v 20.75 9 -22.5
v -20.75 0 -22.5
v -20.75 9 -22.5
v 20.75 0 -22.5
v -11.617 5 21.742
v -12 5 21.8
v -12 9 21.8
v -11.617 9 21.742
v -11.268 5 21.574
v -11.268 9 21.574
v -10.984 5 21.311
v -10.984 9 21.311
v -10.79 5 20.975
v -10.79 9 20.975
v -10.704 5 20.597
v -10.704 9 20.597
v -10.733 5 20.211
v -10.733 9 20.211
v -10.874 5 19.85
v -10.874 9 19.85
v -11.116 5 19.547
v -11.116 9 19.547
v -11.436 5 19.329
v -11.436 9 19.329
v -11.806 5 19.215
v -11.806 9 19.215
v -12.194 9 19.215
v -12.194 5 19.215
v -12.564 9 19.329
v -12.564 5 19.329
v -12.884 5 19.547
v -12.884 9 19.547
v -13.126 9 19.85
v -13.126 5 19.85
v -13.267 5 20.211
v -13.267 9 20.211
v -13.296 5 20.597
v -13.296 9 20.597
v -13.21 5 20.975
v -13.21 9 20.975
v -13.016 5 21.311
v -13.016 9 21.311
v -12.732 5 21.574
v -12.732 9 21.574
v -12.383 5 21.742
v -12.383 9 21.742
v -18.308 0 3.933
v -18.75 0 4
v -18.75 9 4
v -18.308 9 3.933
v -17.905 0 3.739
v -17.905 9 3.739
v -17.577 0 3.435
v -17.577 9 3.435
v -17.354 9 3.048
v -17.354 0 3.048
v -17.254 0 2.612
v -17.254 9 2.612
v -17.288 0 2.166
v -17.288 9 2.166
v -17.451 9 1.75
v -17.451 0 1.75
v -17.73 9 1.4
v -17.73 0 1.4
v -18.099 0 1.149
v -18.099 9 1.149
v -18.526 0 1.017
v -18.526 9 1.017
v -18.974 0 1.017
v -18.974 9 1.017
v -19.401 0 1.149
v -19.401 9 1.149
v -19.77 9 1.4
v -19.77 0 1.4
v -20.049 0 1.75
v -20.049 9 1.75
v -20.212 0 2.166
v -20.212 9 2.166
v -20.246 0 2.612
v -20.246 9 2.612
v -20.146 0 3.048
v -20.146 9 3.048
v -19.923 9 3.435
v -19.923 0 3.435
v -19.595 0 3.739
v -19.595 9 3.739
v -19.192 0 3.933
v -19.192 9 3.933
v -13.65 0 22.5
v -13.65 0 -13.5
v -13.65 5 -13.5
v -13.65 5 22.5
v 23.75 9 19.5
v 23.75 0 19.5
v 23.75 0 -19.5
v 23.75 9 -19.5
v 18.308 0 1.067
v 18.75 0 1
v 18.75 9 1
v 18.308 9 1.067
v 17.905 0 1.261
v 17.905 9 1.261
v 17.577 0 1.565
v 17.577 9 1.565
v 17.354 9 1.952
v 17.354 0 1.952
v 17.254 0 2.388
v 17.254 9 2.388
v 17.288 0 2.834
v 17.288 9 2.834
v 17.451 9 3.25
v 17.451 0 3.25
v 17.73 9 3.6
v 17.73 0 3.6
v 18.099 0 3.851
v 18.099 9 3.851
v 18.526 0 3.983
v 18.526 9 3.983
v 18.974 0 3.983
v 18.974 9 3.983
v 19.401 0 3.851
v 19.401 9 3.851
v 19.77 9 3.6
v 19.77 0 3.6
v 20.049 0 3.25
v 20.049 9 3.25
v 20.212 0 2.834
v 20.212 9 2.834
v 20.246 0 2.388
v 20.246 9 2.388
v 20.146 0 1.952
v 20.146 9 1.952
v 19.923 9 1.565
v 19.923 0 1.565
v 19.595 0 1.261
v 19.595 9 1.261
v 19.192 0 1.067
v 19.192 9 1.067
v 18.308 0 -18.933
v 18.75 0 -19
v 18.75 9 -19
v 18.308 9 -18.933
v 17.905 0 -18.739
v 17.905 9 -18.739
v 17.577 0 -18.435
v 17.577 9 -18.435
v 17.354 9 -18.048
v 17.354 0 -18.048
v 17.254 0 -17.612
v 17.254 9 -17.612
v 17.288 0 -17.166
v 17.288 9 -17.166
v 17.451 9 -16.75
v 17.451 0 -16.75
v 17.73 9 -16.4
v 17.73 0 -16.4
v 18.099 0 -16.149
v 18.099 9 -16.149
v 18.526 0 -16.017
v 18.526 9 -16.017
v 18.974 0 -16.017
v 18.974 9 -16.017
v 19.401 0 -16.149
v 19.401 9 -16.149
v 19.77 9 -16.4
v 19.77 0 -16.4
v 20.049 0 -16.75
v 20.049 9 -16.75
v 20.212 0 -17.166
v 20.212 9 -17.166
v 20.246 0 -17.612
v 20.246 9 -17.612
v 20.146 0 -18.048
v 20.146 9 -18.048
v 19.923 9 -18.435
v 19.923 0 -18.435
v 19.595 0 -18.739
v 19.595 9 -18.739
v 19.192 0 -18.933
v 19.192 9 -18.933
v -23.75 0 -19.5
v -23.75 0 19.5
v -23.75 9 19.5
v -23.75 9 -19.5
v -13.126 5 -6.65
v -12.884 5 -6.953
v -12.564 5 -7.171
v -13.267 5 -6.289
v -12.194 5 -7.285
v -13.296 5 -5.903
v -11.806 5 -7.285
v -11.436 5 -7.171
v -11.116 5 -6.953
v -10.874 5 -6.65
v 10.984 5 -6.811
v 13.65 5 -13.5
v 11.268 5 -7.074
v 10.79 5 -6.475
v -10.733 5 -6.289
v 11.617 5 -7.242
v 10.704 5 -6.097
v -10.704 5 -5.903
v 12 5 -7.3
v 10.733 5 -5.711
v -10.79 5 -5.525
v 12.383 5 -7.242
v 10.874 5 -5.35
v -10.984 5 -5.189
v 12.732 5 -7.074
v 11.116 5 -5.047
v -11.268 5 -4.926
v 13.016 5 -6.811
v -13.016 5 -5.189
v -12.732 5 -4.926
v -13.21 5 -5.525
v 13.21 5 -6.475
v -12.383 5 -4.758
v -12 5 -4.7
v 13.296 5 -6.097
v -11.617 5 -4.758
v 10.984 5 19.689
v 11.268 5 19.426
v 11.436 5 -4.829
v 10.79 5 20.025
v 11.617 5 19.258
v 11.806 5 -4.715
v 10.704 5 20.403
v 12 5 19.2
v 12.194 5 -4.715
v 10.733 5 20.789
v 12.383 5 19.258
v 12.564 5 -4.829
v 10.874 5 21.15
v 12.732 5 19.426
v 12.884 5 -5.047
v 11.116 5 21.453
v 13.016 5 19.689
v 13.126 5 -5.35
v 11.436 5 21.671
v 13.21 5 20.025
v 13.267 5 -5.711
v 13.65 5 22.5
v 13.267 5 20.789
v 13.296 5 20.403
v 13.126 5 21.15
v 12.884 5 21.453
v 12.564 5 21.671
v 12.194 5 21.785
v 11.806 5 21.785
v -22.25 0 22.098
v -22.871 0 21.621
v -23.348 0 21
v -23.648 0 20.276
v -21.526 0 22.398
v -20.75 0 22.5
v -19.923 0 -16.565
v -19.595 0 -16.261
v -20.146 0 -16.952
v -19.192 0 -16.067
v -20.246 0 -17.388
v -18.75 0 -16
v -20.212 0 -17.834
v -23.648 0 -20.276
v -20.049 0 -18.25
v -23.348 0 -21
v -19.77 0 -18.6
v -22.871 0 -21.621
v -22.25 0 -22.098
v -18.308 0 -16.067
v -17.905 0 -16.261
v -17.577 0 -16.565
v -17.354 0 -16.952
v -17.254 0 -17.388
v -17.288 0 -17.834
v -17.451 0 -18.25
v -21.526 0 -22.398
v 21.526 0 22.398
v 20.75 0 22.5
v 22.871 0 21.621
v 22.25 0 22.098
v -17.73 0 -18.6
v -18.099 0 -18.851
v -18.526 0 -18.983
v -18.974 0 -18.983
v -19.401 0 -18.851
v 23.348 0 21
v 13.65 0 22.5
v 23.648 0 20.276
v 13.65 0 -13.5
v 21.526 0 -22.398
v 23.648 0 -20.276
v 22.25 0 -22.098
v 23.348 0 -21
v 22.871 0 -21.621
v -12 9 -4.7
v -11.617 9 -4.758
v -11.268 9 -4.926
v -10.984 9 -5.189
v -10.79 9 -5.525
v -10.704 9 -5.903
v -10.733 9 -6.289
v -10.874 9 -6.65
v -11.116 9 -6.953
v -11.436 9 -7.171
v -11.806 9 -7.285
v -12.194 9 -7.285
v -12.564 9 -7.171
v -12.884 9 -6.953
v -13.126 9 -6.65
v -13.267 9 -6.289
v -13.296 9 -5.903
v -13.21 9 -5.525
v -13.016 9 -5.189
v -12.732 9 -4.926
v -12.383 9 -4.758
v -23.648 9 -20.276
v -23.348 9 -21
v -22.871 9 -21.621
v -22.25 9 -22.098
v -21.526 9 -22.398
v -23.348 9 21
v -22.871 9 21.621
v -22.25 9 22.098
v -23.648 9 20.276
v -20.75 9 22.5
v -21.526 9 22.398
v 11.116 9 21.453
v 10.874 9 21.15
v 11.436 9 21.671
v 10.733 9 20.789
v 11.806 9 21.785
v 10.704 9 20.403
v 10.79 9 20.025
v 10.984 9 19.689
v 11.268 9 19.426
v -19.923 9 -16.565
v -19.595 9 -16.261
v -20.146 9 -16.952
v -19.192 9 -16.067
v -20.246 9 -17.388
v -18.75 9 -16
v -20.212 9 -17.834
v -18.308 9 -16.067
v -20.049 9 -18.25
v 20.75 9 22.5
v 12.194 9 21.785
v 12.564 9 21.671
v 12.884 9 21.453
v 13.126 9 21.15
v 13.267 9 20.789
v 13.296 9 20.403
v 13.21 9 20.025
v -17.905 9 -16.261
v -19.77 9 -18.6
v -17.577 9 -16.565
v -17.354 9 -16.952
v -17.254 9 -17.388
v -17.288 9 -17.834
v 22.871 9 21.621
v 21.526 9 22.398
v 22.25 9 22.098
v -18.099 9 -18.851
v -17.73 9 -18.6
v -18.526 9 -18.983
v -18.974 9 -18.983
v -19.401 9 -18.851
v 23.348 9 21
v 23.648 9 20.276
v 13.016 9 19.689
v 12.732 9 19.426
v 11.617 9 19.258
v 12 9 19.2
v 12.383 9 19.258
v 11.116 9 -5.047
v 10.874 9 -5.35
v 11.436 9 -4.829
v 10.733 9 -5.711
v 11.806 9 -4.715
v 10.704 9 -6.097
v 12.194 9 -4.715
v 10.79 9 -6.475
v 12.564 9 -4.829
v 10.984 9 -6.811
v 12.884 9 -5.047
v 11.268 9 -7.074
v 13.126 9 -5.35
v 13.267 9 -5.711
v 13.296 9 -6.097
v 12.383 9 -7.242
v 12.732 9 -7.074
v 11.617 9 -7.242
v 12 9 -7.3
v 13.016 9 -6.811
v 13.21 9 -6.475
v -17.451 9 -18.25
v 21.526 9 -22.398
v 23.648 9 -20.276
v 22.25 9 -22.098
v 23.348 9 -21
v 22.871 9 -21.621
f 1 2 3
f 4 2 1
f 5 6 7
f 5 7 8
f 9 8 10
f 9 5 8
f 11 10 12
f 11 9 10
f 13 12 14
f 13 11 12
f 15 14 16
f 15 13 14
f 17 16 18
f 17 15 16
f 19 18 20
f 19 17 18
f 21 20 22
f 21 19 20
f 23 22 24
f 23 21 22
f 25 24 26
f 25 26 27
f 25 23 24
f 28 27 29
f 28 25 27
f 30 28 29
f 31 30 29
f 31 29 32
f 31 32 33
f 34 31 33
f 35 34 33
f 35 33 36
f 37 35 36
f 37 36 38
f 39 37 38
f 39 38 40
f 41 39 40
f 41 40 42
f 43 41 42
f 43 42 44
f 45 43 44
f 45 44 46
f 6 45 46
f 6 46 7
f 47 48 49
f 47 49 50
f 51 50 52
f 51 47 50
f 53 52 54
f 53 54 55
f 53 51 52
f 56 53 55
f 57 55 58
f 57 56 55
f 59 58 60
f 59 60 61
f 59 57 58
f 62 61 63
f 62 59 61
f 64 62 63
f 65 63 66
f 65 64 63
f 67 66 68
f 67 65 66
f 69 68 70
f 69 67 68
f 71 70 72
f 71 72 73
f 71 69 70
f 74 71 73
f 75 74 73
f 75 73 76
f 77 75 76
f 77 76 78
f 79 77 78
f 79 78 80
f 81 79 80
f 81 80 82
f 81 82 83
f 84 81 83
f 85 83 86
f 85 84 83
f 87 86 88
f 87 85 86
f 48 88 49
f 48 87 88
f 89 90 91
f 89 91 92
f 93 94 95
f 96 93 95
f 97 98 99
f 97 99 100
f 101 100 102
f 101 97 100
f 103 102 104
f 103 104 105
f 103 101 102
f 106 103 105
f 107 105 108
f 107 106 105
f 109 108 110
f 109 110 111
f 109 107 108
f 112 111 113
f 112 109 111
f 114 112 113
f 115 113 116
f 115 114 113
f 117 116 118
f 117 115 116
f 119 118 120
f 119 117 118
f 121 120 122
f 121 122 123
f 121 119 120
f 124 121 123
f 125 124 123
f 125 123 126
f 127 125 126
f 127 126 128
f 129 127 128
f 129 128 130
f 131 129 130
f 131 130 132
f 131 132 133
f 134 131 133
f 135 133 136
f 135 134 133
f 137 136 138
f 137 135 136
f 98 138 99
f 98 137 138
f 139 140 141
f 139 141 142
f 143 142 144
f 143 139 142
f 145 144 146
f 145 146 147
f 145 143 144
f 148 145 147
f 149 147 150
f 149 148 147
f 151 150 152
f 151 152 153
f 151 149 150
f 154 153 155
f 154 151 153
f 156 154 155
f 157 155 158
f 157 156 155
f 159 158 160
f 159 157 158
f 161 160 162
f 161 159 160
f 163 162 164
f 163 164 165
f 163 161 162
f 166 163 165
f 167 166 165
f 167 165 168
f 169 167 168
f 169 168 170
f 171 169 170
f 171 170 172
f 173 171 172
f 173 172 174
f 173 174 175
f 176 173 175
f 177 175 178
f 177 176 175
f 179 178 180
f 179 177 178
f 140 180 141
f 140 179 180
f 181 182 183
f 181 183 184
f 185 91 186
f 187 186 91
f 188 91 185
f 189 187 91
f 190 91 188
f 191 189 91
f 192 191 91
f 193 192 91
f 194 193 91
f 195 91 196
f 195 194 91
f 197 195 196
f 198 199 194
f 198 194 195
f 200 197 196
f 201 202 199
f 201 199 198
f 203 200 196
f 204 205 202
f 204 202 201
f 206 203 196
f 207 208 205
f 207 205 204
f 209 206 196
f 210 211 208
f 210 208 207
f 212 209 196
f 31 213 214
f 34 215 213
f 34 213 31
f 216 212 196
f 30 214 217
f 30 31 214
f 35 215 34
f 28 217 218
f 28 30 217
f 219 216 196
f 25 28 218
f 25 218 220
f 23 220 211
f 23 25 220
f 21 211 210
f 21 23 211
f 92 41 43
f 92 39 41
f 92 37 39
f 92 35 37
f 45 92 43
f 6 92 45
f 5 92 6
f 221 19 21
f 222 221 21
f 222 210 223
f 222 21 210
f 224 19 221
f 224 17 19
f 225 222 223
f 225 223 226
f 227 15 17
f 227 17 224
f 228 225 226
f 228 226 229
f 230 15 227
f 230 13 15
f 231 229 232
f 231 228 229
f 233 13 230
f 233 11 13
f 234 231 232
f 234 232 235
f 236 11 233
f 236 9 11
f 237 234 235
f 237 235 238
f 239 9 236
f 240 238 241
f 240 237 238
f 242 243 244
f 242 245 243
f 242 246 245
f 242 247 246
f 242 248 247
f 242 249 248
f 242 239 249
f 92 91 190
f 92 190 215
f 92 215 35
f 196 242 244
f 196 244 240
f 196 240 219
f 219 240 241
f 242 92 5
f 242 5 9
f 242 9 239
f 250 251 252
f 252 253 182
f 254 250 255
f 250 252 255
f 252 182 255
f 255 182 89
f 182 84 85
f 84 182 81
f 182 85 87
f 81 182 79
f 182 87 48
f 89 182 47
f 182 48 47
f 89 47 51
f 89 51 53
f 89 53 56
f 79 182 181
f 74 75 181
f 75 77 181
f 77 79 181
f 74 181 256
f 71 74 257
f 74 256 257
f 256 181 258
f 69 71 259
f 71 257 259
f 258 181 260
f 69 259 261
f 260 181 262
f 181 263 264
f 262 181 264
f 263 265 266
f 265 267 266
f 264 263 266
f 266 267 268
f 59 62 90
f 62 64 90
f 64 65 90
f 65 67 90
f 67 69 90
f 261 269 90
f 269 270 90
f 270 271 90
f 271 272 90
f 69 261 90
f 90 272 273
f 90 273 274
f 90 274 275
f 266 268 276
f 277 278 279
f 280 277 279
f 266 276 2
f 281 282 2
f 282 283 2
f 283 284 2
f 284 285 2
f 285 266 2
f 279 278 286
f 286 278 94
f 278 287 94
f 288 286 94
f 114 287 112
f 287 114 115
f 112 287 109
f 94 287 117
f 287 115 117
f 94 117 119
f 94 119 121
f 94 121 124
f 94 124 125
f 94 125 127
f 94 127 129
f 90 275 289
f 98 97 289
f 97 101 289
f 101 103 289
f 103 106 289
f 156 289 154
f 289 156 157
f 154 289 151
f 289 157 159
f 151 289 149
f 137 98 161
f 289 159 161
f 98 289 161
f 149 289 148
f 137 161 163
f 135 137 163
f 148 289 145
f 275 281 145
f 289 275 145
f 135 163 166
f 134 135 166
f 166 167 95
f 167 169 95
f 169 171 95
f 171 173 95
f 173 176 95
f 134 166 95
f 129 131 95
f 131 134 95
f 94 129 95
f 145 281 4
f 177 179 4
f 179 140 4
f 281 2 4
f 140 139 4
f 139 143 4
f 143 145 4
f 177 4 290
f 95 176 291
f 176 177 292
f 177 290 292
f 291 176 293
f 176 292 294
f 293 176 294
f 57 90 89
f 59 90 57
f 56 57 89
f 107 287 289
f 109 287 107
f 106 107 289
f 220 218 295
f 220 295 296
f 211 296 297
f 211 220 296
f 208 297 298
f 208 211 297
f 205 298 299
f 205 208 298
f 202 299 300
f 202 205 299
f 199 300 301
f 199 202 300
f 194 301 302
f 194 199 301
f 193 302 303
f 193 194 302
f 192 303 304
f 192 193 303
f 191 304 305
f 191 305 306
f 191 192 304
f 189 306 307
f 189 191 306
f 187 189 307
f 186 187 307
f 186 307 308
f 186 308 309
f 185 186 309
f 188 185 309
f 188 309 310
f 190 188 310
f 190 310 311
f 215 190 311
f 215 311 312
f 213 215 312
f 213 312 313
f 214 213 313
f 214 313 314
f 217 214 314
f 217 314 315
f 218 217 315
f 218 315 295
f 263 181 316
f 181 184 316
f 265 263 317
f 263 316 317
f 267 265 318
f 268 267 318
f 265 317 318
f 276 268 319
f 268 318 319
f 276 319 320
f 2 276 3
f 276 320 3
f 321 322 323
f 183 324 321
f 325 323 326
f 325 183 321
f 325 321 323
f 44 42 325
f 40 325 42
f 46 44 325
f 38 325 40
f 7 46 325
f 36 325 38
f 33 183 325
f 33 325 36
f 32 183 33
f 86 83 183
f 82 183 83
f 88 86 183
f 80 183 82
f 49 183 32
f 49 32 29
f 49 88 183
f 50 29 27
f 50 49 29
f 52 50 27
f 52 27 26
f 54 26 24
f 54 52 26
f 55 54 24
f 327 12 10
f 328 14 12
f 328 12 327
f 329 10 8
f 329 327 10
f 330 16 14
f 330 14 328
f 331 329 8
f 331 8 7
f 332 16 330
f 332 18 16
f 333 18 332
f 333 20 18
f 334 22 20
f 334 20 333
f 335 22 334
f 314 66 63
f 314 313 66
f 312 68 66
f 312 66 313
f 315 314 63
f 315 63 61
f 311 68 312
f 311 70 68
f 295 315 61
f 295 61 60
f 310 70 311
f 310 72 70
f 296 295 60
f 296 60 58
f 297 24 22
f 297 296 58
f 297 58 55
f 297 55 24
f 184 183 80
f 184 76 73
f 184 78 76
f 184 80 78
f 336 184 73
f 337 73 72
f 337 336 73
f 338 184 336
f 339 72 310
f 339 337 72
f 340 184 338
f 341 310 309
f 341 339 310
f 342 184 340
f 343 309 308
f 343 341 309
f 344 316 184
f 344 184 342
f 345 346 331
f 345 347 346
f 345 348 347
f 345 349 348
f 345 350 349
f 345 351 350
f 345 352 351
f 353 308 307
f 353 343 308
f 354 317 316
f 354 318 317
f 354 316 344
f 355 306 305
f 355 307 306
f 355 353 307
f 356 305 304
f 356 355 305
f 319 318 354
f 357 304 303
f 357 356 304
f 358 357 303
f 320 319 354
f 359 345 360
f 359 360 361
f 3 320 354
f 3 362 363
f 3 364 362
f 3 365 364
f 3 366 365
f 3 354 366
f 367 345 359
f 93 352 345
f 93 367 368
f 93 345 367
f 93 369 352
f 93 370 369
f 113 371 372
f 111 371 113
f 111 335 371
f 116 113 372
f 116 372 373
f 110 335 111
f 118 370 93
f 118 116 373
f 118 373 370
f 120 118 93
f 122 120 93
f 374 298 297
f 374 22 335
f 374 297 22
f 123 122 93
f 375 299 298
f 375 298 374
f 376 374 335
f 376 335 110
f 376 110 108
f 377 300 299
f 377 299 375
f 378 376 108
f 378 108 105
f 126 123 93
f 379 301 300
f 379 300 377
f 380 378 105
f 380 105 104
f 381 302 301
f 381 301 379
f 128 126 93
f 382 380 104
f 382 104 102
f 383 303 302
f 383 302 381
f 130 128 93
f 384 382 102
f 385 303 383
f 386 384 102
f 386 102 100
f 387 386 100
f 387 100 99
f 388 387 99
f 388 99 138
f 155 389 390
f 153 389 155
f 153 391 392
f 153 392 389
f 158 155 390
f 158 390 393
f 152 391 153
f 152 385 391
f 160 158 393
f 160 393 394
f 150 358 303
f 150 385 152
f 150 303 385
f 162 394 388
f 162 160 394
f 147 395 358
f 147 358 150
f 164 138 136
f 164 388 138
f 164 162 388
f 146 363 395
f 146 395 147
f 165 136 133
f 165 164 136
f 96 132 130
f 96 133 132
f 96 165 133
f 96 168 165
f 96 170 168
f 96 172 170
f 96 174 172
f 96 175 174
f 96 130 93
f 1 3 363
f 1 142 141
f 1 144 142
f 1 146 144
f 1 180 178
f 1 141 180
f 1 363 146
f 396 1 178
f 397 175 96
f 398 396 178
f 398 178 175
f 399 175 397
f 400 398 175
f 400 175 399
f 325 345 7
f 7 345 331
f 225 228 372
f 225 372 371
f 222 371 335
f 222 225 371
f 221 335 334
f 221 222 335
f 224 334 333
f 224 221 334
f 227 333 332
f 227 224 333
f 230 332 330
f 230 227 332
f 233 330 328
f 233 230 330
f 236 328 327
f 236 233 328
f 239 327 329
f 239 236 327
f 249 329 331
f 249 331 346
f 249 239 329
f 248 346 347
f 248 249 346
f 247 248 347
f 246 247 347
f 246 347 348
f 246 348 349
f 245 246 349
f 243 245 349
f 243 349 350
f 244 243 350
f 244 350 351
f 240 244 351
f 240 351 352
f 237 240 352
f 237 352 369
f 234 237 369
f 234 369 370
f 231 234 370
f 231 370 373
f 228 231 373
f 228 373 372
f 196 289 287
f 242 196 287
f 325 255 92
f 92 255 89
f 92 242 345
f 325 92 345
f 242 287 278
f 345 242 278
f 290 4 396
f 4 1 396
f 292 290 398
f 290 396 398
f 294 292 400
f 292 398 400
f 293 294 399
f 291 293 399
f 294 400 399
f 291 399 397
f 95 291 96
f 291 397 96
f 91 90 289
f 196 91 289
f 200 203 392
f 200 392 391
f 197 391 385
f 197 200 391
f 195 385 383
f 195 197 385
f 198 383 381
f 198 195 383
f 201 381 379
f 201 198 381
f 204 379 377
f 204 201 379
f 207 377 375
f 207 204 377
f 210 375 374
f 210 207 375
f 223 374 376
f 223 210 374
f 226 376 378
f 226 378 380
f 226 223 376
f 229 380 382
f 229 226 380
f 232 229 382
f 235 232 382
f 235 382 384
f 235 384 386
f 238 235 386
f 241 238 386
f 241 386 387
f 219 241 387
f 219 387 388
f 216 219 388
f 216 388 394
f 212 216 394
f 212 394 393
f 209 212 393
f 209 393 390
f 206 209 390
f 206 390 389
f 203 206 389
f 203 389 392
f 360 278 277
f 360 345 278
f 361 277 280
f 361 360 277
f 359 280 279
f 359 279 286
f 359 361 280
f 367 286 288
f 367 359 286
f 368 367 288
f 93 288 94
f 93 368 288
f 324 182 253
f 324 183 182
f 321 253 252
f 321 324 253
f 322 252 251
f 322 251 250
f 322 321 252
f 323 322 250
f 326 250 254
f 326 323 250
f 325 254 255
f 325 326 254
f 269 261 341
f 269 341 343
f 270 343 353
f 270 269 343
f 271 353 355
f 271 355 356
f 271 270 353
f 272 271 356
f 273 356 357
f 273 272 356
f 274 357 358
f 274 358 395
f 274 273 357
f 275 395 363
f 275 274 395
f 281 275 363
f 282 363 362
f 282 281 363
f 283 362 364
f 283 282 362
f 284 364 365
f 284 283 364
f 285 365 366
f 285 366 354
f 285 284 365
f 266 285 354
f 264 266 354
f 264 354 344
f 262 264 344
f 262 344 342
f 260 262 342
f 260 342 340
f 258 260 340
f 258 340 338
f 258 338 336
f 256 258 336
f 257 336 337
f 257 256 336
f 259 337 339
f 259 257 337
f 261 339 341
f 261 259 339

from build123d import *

# Parameters (mm, degrees)
SKETCH_1_W          = 47.5
SKETCH_1_H          = 45
SKETCH_1_R          = 1.5
SKETCH_1_R_2        = 1.3
EXTRUDE_1_DEPTH     = 9
SKETCH_2_W          = 27.3
SKETCH_2_H          = 36
CUT_EXTRUDE_1_DEPTH = 5
FILLET_1_R          = 3


with BuildPart() as part:
    # 草图1 → 凸台-拉伸1 (new body)
    with BuildSketch(Plane(origin=(0, 0, 0), x_dir=(1, 0, 0), z_dir=(0, 1, 0))):
        Rectangle(SKETCH_1_W, SKETCH_1_H)
        with Locations(Location((-18.75, 17.5, 0), (0, 0, 270))):
            Circle(SKETCH_1_R, mode=Mode.SUBTRACT)
        with Locations(Location((-18.75, -2.5, 0), (0, 0, 270))):
            Circle(SKETCH_1_R, mode=Mode.SUBTRACT)
        with Locations(Location((18.75, -2.5, 0), (0, 0, 90))):
            Circle(SKETCH_1_R, mode=Mode.SUBTRACT)
        with Locations(Location((18.75, 17.5, 0), (0, 0, 90))):
            Circle(SKETCH_1_R, mode=Mode.SUBTRACT)
        with Locations(Location((-12, -20.5, 0), (0, 0, 270))):
            Circle(SKETCH_1_R_2, mode=Mode.SUBTRACT)
        with Locations(Location((-12, 6, 0), (0, 0, 270))):
            Circle(SKETCH_1_R_2, mode=Mode.SUBTRACT)
        with Locations(Location((12, 6, 0), (0, 0, 90))):
            Circle(SKETCH_1_R_2, mode=Mode.SUBTRACT)
        with Locations(Location((12, -20.5, 0), (0, 0, 90))):
            Circle(SKETCH_1_R_2, mode=Mode.SUBTRACT)
    extrude(amount=EXTRUDE_1_DEPTH)

    # 草图2 → 切除-拉伸1 (cut)
    with BuildSketch(Plane.XZ):
        with Locations((0, 4.5)):
            Rectangle(SKETCH_2_W, SKETCH_2_H)
    extrude(amount=-CUT_EXTRUDE_1_DEPTH, mode=Mode.SUBTRACT)

    # 圆角1
    fillet_1_edges = [part.edges().sort_by_distance(p)[0] for p in [
        (23.75, 4.5, 22.5),
        (-23.75, 4.5, 22.5),
        (-23.75, 4.5, -22.5),
        (23.75, 4.5, -22.5),
    ]]
    fillet(fillet_1_edges, radius=FILLET_1_R)


solid = part.part
